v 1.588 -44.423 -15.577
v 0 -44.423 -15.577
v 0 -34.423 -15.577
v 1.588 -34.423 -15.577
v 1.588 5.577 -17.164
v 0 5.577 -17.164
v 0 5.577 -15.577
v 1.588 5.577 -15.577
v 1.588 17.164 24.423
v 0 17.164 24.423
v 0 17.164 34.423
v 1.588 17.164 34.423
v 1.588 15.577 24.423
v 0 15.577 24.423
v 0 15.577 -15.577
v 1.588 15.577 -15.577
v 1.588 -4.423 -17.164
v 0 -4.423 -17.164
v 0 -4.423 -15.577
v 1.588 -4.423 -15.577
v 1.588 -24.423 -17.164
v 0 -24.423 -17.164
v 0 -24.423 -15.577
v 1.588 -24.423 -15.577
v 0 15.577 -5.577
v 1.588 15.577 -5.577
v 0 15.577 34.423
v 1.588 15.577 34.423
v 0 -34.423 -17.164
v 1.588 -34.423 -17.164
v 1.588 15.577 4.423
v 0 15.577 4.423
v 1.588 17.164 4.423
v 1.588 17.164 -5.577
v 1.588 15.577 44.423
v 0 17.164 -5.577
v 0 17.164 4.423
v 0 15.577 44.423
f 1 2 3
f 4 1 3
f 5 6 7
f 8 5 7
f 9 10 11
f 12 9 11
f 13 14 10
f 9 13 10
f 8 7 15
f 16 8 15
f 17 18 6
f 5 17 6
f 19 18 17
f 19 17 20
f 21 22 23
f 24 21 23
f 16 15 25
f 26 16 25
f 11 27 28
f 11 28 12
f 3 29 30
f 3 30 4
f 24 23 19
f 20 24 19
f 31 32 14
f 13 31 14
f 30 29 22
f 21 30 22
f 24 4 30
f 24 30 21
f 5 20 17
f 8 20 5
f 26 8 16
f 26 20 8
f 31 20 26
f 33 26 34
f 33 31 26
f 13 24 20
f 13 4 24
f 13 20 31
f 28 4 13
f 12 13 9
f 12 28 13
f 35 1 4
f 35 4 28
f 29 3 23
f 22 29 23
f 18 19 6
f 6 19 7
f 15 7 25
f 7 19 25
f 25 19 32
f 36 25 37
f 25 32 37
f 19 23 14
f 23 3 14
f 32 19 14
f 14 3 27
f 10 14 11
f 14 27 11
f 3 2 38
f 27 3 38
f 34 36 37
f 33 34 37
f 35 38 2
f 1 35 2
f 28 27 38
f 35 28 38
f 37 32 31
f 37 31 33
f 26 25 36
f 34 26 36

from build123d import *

# Parameters (mm, degrees)
F0_W     = 10
F0_H     = 1.5875
F0_W_2   = 1.5875
F0_H_2   = 10
F1_DEPTH = 1.5875


# Not quite as in the source:
# - a length typed as a fraction of an inch, garbled in the dataset ("3 / 203.2 mm" for 3/8 in), is restored


with BuildPart() as f1:
    # F0 (on Right) → F1 (new body)
    with BuildSketch(Plane.YZ):
        Polygon((15.5766666667, 44.4233333333), (-44.4233333333, -15.5766666667), (-34.4233333333, -15.5766666667), (-24.4233333333, -15.5766666667), (-4.4233333333, -15.5766666667), (5.5766666667, -15.5766666667), (15.5766666667, -15.5766666667), (15.5766666667, -5.5766666667), (15.5766666667, 4.4233333333), (15.5766666667, 24.4233333333), (15.5766666667, 34.4233333333), align=None)
        with Locations((-29.4233333333, -16.3704166667)):
            Rectangle(F0_W, F0_H)
        with Locations((16.3704166667, 29.4233333333)):
            Rectangle(F0_W_2, F0_H_2)
        with Locations((0.5766666667, -16.3704166667)):
            Rectangle(F0_W, F0_H)
        with Locations((16.3704166667, -0.5766666667)):
            Rectangle(F0_W_2, F0_H_2)
    extrude(amount=F1_DEPTH)


solid = f1.part
